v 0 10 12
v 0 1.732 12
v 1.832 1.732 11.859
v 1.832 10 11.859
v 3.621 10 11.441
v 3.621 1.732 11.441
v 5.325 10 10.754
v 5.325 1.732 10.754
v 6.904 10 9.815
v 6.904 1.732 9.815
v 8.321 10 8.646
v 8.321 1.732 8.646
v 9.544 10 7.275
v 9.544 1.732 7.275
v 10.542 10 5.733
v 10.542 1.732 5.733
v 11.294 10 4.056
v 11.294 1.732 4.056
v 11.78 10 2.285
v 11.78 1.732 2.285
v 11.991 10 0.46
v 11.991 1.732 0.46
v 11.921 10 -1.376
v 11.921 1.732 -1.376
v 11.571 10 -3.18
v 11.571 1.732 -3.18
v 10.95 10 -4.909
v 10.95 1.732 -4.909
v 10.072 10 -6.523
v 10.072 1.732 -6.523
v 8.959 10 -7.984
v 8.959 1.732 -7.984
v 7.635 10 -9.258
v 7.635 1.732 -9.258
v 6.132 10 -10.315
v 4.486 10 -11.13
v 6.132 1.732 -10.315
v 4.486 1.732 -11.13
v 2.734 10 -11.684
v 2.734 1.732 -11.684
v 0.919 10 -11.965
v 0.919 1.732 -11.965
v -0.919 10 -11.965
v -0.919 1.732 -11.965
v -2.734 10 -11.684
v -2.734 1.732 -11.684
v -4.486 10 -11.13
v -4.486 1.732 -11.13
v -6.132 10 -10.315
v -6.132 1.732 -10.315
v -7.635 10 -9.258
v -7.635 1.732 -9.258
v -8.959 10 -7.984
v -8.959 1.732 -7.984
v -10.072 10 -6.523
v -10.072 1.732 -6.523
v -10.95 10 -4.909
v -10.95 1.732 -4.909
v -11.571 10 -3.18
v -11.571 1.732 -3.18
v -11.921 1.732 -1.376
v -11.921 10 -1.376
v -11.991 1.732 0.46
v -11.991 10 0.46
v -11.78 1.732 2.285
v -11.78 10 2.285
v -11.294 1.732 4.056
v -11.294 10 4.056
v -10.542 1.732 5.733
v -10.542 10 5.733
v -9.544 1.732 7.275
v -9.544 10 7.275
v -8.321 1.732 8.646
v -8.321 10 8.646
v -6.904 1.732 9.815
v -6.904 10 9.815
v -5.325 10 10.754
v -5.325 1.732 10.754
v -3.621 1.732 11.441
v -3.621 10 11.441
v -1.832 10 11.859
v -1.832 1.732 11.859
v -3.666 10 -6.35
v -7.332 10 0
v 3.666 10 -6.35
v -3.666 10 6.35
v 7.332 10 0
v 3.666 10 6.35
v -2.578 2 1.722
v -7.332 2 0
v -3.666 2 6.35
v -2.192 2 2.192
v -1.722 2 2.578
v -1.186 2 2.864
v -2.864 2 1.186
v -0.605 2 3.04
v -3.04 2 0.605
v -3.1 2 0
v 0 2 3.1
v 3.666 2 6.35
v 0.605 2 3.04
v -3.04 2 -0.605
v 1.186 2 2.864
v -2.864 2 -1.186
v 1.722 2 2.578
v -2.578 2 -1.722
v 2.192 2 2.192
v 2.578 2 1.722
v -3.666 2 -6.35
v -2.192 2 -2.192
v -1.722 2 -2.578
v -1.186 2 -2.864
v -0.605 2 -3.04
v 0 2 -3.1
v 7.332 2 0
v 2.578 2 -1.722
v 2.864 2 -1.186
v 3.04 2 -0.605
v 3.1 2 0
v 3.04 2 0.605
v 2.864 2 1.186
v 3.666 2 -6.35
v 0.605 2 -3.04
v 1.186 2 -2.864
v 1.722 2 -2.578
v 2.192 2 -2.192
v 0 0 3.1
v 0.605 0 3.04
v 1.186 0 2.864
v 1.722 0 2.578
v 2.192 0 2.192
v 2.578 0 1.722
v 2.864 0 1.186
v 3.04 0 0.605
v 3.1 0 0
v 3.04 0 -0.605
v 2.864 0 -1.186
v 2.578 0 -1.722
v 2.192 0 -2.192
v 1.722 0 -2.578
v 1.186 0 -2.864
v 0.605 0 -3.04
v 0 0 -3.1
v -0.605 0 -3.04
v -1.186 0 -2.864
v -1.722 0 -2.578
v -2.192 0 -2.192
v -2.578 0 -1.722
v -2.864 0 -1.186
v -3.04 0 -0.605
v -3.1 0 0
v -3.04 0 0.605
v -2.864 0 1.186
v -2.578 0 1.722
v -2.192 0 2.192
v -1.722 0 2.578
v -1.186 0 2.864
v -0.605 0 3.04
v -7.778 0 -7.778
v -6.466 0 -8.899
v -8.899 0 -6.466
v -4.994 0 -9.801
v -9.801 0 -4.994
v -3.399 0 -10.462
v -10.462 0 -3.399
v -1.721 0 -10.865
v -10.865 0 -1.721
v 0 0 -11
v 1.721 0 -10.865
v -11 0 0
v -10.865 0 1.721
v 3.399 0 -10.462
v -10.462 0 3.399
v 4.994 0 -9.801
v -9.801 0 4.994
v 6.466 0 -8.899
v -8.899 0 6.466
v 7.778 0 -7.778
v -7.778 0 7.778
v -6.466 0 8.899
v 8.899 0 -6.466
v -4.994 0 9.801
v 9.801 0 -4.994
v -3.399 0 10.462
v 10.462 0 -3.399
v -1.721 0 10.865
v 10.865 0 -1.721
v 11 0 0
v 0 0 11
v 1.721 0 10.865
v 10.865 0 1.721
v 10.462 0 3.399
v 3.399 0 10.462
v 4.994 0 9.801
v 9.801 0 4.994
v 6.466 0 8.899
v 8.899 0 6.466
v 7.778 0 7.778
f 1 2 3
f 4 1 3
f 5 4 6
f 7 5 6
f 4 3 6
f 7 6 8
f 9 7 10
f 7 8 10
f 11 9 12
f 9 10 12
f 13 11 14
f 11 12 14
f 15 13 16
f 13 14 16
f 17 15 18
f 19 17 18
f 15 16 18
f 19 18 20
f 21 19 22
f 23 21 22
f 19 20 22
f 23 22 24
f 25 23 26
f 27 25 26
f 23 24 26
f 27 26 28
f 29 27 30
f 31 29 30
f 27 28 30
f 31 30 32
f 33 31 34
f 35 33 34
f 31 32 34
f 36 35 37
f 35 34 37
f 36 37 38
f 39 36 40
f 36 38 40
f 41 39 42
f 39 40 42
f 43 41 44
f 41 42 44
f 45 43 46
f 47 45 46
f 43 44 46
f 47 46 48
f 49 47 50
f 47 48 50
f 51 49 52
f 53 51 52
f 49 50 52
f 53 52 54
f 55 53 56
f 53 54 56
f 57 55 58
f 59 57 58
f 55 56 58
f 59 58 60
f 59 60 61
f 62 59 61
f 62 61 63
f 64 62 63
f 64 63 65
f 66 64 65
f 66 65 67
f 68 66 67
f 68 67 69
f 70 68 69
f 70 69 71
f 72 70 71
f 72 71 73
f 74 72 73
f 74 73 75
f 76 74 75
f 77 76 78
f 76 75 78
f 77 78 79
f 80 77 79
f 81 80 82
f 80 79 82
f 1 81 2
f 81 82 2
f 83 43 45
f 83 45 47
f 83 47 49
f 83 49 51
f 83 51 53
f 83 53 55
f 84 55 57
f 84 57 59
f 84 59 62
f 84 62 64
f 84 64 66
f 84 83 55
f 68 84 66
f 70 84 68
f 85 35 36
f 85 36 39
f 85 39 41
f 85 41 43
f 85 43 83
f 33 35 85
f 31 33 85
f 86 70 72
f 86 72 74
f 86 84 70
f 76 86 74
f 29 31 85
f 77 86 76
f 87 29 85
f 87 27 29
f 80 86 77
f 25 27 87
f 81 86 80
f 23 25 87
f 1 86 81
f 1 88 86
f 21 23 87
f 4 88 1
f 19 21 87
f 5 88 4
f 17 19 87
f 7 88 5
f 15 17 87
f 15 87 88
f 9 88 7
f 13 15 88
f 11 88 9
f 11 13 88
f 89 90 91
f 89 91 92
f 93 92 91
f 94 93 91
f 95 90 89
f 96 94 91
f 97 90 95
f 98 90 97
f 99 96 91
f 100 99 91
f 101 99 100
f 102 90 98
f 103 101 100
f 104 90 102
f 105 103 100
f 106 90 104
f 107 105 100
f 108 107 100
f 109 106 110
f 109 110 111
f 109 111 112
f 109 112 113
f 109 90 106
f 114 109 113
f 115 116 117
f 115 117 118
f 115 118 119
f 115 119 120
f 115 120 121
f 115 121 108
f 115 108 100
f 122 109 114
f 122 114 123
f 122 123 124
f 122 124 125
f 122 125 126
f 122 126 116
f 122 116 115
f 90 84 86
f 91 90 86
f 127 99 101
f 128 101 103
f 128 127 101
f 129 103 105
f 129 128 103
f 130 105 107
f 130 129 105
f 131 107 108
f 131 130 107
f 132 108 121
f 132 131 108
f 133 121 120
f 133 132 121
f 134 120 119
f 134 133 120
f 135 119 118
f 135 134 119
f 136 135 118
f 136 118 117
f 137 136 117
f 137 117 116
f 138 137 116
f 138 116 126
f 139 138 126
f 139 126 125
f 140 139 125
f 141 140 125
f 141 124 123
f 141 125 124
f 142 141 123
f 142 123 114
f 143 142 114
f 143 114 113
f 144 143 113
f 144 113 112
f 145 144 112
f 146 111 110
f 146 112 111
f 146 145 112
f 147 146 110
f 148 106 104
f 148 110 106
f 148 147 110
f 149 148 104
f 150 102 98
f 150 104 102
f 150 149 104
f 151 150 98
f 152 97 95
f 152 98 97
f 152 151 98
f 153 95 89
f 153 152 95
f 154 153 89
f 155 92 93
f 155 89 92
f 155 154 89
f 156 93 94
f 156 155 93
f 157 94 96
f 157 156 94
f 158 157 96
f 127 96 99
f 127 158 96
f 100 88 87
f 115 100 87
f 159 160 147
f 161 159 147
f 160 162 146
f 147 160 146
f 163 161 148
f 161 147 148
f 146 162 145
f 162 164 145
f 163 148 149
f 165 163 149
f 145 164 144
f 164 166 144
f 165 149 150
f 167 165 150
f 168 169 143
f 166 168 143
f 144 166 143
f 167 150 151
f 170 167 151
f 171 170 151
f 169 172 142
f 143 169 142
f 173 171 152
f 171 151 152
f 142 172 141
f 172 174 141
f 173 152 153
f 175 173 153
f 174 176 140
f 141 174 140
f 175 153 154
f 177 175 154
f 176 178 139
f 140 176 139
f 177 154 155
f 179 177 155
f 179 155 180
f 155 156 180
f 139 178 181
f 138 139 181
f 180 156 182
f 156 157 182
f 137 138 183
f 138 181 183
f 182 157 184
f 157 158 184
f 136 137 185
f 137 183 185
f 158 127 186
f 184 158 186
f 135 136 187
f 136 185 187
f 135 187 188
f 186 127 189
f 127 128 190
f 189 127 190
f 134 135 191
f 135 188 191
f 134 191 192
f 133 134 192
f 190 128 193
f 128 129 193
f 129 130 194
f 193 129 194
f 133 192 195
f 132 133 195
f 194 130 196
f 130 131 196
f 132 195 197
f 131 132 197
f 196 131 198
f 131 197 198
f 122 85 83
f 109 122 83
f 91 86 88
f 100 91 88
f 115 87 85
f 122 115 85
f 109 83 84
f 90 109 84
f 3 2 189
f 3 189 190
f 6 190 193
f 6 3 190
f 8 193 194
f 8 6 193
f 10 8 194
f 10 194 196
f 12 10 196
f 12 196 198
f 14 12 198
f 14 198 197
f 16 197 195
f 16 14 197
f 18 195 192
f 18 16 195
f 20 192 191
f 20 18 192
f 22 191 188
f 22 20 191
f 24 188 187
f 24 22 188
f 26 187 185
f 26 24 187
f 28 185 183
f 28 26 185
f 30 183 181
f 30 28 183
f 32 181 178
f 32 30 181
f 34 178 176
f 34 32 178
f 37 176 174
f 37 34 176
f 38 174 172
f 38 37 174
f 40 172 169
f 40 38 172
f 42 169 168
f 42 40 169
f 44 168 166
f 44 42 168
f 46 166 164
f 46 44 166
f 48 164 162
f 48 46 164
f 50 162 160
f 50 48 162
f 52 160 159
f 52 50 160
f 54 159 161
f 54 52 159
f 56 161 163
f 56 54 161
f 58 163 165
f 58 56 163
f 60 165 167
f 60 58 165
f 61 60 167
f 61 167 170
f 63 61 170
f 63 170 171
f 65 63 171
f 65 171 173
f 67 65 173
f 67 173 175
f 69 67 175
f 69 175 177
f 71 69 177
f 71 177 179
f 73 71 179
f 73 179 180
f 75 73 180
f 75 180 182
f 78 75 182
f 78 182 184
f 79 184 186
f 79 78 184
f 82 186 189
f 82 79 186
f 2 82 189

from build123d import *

# Parameters (mm, degrees)
SKETCH1_R           = 12
SKETCH1_R_2         = 3.1
BOSS_EXTRUDE1_DEPTH = 10
CUT_EXTRUDE1_DEPTH  = 8
CHAMFER1_SIZE       = 1
CHAMFER1_SIZE2      = 1.732050808


with BuildPart() as part:
    # Sketch1 → Boss-Extrude1 (new body)
    with BuildSketch(Plane(origin=(0, 0, 0), x_dir=(1, 0, 0), z_dir=(0, 1, 0))):
        with Locations(Location((0, 0, 0), (0, 0, 270))):
            Circle(SKETCH1_R)
        with Locations(Location((0, 0, 0), (0, 0, 270))):
            Circle(SKETCH1_R_2, mode=Mode.SUBTRACT)
    extrude(amount=BOSS_EXTRUDE1_DEPTH)

    # Sketch2 → Cut-Extrude1 (cut)
    with BuildSketch(Plane(origin=(0, 10, 0), x_dir=(1, 0, 0), z_dir=(0, 1, 0))):
        Polygon((7.332348419, 0), (3.666174209, 6.35), (-3.666174209, 6.35), (-7.332348419, 0), (-3.666174209, -6.35), (3.666174209, -6.35), align=None)
    extrude(amount=-CUT_EXTRUDE1_DEPTH, mode=Mode.SUBTRACT)

    # Chamfer1
    chamfer1_edges = [part.edges().sort_by_distance(p)[0] for p in [
        (0, 0, -12),
    ]]
    chamfer1_side = [part.faces().sort_by_distance(p)[0] for p in [
        (0, 0, -11.660588745),
    ]]
    chamfer(chamfer1_edges, length=CHAMFER1_SIZE, length2=CHAMFER1_SIZE2, reference=chamfer1_side[0])


solid = part.part
